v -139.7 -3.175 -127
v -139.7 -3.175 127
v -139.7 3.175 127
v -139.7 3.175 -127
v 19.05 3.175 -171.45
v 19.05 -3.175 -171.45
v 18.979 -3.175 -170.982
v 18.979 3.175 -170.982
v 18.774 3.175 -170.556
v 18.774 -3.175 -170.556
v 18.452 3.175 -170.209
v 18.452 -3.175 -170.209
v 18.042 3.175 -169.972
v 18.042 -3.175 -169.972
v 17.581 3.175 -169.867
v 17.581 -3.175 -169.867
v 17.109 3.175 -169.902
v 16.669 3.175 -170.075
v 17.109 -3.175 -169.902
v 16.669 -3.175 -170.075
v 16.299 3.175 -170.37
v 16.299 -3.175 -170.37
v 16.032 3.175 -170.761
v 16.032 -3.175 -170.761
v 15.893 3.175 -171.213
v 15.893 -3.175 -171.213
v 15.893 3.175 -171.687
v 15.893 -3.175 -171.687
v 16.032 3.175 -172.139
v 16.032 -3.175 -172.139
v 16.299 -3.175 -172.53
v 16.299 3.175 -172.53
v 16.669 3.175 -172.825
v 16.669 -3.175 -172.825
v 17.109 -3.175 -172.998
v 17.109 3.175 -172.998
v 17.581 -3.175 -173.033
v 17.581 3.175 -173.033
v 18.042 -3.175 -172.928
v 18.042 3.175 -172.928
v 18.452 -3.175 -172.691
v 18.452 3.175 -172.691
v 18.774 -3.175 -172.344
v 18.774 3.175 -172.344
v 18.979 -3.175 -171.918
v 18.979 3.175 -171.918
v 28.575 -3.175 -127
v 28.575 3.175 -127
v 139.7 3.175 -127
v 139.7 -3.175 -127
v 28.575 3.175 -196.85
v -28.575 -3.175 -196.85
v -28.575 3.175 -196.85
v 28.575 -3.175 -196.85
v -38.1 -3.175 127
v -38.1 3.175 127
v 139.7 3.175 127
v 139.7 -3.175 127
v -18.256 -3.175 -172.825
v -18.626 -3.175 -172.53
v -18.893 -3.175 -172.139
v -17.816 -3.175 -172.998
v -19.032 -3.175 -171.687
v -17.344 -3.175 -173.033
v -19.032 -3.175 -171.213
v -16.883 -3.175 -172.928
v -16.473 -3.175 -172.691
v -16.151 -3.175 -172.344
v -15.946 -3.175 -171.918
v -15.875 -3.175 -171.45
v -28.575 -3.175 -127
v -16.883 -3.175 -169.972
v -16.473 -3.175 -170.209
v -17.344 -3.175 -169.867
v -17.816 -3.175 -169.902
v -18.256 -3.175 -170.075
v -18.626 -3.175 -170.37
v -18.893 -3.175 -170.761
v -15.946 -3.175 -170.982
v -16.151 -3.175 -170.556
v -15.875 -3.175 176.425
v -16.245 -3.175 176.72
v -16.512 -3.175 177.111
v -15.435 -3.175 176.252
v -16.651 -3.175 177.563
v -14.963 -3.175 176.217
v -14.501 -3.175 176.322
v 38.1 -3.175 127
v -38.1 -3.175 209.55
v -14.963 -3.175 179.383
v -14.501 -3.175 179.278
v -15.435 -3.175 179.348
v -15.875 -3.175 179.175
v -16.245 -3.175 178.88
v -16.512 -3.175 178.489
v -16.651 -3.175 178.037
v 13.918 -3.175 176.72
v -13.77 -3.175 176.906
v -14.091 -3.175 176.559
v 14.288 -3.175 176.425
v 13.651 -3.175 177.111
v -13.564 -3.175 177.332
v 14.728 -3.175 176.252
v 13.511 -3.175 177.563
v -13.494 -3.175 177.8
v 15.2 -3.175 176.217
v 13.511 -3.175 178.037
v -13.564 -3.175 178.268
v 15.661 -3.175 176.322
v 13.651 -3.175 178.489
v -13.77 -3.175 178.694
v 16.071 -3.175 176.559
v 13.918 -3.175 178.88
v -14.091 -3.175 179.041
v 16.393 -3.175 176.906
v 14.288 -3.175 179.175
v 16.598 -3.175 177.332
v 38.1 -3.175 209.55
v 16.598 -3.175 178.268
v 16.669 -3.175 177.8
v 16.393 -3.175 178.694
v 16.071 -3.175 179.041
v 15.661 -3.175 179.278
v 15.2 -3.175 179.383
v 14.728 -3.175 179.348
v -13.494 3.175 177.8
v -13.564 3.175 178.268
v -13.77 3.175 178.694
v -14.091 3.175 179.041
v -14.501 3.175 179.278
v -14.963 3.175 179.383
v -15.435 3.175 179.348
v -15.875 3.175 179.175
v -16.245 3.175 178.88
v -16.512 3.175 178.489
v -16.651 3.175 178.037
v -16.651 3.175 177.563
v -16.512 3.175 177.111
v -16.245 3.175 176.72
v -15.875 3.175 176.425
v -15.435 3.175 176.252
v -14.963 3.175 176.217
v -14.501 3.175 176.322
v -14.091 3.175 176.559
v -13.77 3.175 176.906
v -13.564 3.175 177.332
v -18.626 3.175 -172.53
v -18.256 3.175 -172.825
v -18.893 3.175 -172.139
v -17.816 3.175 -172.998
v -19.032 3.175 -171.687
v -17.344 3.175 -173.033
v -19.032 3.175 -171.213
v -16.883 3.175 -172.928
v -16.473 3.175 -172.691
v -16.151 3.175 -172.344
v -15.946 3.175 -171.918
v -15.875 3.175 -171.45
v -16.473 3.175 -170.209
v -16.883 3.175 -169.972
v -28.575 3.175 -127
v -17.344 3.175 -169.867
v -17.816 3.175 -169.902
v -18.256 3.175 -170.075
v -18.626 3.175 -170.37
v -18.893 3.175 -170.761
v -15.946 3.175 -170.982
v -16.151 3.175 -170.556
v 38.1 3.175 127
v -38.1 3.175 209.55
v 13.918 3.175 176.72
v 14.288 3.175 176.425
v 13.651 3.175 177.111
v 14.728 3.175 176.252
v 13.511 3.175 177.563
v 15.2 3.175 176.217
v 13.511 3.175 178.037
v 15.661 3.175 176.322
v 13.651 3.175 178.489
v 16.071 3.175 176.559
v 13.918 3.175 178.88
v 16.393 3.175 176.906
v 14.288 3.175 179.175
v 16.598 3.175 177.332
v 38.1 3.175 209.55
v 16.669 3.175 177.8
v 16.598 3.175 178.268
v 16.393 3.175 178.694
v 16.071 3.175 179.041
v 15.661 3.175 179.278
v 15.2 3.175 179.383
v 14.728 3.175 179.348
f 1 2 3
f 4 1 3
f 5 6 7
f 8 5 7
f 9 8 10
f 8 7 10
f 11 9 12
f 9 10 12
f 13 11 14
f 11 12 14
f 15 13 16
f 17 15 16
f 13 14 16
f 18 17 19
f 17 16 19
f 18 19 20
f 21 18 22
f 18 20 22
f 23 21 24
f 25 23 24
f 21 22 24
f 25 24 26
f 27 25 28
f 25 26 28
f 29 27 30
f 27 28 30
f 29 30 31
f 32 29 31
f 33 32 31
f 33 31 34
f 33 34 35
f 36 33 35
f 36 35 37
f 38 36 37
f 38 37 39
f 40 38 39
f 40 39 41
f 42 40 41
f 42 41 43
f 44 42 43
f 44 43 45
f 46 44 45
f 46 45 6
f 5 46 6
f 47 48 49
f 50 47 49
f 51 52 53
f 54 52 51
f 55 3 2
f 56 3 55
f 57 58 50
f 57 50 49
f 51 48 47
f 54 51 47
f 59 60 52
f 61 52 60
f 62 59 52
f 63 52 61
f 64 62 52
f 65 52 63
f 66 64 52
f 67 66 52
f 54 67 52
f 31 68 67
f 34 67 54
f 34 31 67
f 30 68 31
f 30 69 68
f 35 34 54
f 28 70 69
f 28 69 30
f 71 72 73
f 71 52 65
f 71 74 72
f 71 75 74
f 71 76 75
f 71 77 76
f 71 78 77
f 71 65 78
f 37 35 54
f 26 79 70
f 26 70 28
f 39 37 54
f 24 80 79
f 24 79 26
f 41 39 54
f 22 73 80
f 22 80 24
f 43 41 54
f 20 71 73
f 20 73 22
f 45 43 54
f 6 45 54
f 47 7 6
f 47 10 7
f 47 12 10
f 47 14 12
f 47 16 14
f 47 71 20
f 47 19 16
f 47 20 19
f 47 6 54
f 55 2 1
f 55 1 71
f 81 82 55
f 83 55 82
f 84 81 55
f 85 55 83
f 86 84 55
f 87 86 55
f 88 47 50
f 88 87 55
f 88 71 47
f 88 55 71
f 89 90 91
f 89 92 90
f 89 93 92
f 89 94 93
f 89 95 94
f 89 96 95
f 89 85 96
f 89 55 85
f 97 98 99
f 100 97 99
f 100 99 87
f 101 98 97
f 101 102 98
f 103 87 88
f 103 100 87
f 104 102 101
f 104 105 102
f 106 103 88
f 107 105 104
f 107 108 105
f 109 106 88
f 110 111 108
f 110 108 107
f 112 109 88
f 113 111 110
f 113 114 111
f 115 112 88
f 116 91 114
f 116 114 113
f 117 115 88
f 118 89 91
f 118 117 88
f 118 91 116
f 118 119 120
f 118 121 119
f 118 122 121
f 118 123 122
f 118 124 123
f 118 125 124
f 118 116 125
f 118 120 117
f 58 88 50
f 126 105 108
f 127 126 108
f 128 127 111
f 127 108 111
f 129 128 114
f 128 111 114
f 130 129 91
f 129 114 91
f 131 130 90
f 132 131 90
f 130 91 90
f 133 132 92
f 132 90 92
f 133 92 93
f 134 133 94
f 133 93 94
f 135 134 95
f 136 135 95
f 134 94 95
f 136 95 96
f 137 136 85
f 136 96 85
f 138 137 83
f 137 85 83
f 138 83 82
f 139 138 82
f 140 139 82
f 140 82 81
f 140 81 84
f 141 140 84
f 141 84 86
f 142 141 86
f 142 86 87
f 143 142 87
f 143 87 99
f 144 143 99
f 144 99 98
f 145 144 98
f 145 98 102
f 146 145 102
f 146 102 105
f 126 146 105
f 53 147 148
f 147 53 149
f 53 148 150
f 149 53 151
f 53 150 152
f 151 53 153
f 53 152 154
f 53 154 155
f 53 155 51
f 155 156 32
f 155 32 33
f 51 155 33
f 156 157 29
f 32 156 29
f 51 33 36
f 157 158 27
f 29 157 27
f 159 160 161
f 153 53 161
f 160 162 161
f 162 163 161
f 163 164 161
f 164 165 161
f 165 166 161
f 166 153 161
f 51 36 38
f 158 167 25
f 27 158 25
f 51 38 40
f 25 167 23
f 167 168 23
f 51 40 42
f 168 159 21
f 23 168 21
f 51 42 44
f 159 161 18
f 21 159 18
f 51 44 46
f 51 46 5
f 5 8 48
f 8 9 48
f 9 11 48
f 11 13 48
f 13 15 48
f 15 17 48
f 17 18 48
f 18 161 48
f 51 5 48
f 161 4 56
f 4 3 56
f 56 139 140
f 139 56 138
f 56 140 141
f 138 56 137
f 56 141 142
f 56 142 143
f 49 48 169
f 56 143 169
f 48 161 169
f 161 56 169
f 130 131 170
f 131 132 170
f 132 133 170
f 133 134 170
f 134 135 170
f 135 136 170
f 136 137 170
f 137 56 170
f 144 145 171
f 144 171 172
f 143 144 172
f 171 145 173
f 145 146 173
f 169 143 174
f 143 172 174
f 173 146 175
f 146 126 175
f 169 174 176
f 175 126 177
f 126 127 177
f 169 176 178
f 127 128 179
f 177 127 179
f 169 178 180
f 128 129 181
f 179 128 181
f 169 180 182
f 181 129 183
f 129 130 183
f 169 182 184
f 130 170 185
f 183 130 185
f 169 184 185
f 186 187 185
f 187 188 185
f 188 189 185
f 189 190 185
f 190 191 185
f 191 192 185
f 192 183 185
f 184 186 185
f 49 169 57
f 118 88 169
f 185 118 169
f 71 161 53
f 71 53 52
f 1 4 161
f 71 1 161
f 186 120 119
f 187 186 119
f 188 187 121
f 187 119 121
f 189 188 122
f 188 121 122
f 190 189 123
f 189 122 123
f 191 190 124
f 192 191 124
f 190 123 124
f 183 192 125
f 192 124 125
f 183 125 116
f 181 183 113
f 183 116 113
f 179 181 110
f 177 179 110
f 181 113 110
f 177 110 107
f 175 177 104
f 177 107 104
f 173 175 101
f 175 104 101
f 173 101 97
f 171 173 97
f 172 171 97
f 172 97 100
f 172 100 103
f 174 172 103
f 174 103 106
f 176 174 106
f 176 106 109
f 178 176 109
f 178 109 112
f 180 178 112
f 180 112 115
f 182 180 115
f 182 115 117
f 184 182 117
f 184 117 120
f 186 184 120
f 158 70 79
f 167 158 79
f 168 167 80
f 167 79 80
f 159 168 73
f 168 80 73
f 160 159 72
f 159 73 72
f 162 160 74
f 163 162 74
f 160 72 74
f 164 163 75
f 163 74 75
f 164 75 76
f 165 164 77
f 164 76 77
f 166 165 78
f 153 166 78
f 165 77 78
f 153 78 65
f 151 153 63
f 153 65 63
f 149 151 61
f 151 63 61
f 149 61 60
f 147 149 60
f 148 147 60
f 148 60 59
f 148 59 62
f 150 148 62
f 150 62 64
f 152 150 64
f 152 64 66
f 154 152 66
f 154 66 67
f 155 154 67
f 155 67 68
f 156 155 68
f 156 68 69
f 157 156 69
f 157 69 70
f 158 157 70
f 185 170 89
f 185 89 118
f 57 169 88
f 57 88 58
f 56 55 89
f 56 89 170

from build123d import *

# Parameters (mm, degrees)
F0_W          = 279.4
F0_H          = 6.35
F1_DEPTH      = 127
F1_DEPTH_BACK = 127
F2_W          = 76.2
F2_H          = 6.35
F3_DEPTH      = 82.55
F4_W          = 57.15
F4_H          = 6.35
F5_DEPTH      = 69.85
F6_R          = 1.5875
F7_DEPTH      = 6.351
F8_R          = 1.5875
F9_DEPTH      = 6.351


with BuildPart() as f1:
    # F0 (on Top) → F1 (new body, two sides)
    with BuildSketch(Plane.XY) as f1_sk:
        Rectangle(F0_W, F0_H)
    extrude(amount=F1_DEPTH)
    extrude(f1_sk.sketch, amount=-F1_DEPTH_BACK)

    # F0 (on Top) + F2 (on face) → F3 (join)
    with BuildSketch(Plane.XY):
        Rectangle(F0_W, F0_H)
    with BuildSketch(Plane.XY.offset(127)):
        Rectangle(F2_W, F2_H)
    extrude(amount=F3_DEPTH)

    # F4 (on face) → F5 (join)
    with BuildSketch(Plane(origin=(0, 0, -127), x_dir=(1, 0, 0), z_dir=(0, 0, -1))):
        Rectangle(F4_W, F4_H)
    extrude(amount=F5_DEPTH)

    # F6 (on face) → F7 (cut, through all)
    with BuildSketch(Plane.XZ.offset(3.175)):
        with Locations((-17.4625, -171.45)):
            Circle(F6_R)
        with Locations((17.4625, -171.45)):
            Circle(F6_R)
    extrude(amount=-F7_DEPTH, mode=Mode.SUBTRACT)

    # F8 (on face) → F9 (cut, through all)
    with BuildSketch(Plane.XZ.offset(3.175)):
        with Locations((-15.08125, 177.8)):
            Circle(F8_R)
        with Locations((15.08125, 177.8)):
            Circle(F8_R)
    extrude(amount=-F9_DEPTH, mode=Mode.SUBTRACT)


solid = f1.part
